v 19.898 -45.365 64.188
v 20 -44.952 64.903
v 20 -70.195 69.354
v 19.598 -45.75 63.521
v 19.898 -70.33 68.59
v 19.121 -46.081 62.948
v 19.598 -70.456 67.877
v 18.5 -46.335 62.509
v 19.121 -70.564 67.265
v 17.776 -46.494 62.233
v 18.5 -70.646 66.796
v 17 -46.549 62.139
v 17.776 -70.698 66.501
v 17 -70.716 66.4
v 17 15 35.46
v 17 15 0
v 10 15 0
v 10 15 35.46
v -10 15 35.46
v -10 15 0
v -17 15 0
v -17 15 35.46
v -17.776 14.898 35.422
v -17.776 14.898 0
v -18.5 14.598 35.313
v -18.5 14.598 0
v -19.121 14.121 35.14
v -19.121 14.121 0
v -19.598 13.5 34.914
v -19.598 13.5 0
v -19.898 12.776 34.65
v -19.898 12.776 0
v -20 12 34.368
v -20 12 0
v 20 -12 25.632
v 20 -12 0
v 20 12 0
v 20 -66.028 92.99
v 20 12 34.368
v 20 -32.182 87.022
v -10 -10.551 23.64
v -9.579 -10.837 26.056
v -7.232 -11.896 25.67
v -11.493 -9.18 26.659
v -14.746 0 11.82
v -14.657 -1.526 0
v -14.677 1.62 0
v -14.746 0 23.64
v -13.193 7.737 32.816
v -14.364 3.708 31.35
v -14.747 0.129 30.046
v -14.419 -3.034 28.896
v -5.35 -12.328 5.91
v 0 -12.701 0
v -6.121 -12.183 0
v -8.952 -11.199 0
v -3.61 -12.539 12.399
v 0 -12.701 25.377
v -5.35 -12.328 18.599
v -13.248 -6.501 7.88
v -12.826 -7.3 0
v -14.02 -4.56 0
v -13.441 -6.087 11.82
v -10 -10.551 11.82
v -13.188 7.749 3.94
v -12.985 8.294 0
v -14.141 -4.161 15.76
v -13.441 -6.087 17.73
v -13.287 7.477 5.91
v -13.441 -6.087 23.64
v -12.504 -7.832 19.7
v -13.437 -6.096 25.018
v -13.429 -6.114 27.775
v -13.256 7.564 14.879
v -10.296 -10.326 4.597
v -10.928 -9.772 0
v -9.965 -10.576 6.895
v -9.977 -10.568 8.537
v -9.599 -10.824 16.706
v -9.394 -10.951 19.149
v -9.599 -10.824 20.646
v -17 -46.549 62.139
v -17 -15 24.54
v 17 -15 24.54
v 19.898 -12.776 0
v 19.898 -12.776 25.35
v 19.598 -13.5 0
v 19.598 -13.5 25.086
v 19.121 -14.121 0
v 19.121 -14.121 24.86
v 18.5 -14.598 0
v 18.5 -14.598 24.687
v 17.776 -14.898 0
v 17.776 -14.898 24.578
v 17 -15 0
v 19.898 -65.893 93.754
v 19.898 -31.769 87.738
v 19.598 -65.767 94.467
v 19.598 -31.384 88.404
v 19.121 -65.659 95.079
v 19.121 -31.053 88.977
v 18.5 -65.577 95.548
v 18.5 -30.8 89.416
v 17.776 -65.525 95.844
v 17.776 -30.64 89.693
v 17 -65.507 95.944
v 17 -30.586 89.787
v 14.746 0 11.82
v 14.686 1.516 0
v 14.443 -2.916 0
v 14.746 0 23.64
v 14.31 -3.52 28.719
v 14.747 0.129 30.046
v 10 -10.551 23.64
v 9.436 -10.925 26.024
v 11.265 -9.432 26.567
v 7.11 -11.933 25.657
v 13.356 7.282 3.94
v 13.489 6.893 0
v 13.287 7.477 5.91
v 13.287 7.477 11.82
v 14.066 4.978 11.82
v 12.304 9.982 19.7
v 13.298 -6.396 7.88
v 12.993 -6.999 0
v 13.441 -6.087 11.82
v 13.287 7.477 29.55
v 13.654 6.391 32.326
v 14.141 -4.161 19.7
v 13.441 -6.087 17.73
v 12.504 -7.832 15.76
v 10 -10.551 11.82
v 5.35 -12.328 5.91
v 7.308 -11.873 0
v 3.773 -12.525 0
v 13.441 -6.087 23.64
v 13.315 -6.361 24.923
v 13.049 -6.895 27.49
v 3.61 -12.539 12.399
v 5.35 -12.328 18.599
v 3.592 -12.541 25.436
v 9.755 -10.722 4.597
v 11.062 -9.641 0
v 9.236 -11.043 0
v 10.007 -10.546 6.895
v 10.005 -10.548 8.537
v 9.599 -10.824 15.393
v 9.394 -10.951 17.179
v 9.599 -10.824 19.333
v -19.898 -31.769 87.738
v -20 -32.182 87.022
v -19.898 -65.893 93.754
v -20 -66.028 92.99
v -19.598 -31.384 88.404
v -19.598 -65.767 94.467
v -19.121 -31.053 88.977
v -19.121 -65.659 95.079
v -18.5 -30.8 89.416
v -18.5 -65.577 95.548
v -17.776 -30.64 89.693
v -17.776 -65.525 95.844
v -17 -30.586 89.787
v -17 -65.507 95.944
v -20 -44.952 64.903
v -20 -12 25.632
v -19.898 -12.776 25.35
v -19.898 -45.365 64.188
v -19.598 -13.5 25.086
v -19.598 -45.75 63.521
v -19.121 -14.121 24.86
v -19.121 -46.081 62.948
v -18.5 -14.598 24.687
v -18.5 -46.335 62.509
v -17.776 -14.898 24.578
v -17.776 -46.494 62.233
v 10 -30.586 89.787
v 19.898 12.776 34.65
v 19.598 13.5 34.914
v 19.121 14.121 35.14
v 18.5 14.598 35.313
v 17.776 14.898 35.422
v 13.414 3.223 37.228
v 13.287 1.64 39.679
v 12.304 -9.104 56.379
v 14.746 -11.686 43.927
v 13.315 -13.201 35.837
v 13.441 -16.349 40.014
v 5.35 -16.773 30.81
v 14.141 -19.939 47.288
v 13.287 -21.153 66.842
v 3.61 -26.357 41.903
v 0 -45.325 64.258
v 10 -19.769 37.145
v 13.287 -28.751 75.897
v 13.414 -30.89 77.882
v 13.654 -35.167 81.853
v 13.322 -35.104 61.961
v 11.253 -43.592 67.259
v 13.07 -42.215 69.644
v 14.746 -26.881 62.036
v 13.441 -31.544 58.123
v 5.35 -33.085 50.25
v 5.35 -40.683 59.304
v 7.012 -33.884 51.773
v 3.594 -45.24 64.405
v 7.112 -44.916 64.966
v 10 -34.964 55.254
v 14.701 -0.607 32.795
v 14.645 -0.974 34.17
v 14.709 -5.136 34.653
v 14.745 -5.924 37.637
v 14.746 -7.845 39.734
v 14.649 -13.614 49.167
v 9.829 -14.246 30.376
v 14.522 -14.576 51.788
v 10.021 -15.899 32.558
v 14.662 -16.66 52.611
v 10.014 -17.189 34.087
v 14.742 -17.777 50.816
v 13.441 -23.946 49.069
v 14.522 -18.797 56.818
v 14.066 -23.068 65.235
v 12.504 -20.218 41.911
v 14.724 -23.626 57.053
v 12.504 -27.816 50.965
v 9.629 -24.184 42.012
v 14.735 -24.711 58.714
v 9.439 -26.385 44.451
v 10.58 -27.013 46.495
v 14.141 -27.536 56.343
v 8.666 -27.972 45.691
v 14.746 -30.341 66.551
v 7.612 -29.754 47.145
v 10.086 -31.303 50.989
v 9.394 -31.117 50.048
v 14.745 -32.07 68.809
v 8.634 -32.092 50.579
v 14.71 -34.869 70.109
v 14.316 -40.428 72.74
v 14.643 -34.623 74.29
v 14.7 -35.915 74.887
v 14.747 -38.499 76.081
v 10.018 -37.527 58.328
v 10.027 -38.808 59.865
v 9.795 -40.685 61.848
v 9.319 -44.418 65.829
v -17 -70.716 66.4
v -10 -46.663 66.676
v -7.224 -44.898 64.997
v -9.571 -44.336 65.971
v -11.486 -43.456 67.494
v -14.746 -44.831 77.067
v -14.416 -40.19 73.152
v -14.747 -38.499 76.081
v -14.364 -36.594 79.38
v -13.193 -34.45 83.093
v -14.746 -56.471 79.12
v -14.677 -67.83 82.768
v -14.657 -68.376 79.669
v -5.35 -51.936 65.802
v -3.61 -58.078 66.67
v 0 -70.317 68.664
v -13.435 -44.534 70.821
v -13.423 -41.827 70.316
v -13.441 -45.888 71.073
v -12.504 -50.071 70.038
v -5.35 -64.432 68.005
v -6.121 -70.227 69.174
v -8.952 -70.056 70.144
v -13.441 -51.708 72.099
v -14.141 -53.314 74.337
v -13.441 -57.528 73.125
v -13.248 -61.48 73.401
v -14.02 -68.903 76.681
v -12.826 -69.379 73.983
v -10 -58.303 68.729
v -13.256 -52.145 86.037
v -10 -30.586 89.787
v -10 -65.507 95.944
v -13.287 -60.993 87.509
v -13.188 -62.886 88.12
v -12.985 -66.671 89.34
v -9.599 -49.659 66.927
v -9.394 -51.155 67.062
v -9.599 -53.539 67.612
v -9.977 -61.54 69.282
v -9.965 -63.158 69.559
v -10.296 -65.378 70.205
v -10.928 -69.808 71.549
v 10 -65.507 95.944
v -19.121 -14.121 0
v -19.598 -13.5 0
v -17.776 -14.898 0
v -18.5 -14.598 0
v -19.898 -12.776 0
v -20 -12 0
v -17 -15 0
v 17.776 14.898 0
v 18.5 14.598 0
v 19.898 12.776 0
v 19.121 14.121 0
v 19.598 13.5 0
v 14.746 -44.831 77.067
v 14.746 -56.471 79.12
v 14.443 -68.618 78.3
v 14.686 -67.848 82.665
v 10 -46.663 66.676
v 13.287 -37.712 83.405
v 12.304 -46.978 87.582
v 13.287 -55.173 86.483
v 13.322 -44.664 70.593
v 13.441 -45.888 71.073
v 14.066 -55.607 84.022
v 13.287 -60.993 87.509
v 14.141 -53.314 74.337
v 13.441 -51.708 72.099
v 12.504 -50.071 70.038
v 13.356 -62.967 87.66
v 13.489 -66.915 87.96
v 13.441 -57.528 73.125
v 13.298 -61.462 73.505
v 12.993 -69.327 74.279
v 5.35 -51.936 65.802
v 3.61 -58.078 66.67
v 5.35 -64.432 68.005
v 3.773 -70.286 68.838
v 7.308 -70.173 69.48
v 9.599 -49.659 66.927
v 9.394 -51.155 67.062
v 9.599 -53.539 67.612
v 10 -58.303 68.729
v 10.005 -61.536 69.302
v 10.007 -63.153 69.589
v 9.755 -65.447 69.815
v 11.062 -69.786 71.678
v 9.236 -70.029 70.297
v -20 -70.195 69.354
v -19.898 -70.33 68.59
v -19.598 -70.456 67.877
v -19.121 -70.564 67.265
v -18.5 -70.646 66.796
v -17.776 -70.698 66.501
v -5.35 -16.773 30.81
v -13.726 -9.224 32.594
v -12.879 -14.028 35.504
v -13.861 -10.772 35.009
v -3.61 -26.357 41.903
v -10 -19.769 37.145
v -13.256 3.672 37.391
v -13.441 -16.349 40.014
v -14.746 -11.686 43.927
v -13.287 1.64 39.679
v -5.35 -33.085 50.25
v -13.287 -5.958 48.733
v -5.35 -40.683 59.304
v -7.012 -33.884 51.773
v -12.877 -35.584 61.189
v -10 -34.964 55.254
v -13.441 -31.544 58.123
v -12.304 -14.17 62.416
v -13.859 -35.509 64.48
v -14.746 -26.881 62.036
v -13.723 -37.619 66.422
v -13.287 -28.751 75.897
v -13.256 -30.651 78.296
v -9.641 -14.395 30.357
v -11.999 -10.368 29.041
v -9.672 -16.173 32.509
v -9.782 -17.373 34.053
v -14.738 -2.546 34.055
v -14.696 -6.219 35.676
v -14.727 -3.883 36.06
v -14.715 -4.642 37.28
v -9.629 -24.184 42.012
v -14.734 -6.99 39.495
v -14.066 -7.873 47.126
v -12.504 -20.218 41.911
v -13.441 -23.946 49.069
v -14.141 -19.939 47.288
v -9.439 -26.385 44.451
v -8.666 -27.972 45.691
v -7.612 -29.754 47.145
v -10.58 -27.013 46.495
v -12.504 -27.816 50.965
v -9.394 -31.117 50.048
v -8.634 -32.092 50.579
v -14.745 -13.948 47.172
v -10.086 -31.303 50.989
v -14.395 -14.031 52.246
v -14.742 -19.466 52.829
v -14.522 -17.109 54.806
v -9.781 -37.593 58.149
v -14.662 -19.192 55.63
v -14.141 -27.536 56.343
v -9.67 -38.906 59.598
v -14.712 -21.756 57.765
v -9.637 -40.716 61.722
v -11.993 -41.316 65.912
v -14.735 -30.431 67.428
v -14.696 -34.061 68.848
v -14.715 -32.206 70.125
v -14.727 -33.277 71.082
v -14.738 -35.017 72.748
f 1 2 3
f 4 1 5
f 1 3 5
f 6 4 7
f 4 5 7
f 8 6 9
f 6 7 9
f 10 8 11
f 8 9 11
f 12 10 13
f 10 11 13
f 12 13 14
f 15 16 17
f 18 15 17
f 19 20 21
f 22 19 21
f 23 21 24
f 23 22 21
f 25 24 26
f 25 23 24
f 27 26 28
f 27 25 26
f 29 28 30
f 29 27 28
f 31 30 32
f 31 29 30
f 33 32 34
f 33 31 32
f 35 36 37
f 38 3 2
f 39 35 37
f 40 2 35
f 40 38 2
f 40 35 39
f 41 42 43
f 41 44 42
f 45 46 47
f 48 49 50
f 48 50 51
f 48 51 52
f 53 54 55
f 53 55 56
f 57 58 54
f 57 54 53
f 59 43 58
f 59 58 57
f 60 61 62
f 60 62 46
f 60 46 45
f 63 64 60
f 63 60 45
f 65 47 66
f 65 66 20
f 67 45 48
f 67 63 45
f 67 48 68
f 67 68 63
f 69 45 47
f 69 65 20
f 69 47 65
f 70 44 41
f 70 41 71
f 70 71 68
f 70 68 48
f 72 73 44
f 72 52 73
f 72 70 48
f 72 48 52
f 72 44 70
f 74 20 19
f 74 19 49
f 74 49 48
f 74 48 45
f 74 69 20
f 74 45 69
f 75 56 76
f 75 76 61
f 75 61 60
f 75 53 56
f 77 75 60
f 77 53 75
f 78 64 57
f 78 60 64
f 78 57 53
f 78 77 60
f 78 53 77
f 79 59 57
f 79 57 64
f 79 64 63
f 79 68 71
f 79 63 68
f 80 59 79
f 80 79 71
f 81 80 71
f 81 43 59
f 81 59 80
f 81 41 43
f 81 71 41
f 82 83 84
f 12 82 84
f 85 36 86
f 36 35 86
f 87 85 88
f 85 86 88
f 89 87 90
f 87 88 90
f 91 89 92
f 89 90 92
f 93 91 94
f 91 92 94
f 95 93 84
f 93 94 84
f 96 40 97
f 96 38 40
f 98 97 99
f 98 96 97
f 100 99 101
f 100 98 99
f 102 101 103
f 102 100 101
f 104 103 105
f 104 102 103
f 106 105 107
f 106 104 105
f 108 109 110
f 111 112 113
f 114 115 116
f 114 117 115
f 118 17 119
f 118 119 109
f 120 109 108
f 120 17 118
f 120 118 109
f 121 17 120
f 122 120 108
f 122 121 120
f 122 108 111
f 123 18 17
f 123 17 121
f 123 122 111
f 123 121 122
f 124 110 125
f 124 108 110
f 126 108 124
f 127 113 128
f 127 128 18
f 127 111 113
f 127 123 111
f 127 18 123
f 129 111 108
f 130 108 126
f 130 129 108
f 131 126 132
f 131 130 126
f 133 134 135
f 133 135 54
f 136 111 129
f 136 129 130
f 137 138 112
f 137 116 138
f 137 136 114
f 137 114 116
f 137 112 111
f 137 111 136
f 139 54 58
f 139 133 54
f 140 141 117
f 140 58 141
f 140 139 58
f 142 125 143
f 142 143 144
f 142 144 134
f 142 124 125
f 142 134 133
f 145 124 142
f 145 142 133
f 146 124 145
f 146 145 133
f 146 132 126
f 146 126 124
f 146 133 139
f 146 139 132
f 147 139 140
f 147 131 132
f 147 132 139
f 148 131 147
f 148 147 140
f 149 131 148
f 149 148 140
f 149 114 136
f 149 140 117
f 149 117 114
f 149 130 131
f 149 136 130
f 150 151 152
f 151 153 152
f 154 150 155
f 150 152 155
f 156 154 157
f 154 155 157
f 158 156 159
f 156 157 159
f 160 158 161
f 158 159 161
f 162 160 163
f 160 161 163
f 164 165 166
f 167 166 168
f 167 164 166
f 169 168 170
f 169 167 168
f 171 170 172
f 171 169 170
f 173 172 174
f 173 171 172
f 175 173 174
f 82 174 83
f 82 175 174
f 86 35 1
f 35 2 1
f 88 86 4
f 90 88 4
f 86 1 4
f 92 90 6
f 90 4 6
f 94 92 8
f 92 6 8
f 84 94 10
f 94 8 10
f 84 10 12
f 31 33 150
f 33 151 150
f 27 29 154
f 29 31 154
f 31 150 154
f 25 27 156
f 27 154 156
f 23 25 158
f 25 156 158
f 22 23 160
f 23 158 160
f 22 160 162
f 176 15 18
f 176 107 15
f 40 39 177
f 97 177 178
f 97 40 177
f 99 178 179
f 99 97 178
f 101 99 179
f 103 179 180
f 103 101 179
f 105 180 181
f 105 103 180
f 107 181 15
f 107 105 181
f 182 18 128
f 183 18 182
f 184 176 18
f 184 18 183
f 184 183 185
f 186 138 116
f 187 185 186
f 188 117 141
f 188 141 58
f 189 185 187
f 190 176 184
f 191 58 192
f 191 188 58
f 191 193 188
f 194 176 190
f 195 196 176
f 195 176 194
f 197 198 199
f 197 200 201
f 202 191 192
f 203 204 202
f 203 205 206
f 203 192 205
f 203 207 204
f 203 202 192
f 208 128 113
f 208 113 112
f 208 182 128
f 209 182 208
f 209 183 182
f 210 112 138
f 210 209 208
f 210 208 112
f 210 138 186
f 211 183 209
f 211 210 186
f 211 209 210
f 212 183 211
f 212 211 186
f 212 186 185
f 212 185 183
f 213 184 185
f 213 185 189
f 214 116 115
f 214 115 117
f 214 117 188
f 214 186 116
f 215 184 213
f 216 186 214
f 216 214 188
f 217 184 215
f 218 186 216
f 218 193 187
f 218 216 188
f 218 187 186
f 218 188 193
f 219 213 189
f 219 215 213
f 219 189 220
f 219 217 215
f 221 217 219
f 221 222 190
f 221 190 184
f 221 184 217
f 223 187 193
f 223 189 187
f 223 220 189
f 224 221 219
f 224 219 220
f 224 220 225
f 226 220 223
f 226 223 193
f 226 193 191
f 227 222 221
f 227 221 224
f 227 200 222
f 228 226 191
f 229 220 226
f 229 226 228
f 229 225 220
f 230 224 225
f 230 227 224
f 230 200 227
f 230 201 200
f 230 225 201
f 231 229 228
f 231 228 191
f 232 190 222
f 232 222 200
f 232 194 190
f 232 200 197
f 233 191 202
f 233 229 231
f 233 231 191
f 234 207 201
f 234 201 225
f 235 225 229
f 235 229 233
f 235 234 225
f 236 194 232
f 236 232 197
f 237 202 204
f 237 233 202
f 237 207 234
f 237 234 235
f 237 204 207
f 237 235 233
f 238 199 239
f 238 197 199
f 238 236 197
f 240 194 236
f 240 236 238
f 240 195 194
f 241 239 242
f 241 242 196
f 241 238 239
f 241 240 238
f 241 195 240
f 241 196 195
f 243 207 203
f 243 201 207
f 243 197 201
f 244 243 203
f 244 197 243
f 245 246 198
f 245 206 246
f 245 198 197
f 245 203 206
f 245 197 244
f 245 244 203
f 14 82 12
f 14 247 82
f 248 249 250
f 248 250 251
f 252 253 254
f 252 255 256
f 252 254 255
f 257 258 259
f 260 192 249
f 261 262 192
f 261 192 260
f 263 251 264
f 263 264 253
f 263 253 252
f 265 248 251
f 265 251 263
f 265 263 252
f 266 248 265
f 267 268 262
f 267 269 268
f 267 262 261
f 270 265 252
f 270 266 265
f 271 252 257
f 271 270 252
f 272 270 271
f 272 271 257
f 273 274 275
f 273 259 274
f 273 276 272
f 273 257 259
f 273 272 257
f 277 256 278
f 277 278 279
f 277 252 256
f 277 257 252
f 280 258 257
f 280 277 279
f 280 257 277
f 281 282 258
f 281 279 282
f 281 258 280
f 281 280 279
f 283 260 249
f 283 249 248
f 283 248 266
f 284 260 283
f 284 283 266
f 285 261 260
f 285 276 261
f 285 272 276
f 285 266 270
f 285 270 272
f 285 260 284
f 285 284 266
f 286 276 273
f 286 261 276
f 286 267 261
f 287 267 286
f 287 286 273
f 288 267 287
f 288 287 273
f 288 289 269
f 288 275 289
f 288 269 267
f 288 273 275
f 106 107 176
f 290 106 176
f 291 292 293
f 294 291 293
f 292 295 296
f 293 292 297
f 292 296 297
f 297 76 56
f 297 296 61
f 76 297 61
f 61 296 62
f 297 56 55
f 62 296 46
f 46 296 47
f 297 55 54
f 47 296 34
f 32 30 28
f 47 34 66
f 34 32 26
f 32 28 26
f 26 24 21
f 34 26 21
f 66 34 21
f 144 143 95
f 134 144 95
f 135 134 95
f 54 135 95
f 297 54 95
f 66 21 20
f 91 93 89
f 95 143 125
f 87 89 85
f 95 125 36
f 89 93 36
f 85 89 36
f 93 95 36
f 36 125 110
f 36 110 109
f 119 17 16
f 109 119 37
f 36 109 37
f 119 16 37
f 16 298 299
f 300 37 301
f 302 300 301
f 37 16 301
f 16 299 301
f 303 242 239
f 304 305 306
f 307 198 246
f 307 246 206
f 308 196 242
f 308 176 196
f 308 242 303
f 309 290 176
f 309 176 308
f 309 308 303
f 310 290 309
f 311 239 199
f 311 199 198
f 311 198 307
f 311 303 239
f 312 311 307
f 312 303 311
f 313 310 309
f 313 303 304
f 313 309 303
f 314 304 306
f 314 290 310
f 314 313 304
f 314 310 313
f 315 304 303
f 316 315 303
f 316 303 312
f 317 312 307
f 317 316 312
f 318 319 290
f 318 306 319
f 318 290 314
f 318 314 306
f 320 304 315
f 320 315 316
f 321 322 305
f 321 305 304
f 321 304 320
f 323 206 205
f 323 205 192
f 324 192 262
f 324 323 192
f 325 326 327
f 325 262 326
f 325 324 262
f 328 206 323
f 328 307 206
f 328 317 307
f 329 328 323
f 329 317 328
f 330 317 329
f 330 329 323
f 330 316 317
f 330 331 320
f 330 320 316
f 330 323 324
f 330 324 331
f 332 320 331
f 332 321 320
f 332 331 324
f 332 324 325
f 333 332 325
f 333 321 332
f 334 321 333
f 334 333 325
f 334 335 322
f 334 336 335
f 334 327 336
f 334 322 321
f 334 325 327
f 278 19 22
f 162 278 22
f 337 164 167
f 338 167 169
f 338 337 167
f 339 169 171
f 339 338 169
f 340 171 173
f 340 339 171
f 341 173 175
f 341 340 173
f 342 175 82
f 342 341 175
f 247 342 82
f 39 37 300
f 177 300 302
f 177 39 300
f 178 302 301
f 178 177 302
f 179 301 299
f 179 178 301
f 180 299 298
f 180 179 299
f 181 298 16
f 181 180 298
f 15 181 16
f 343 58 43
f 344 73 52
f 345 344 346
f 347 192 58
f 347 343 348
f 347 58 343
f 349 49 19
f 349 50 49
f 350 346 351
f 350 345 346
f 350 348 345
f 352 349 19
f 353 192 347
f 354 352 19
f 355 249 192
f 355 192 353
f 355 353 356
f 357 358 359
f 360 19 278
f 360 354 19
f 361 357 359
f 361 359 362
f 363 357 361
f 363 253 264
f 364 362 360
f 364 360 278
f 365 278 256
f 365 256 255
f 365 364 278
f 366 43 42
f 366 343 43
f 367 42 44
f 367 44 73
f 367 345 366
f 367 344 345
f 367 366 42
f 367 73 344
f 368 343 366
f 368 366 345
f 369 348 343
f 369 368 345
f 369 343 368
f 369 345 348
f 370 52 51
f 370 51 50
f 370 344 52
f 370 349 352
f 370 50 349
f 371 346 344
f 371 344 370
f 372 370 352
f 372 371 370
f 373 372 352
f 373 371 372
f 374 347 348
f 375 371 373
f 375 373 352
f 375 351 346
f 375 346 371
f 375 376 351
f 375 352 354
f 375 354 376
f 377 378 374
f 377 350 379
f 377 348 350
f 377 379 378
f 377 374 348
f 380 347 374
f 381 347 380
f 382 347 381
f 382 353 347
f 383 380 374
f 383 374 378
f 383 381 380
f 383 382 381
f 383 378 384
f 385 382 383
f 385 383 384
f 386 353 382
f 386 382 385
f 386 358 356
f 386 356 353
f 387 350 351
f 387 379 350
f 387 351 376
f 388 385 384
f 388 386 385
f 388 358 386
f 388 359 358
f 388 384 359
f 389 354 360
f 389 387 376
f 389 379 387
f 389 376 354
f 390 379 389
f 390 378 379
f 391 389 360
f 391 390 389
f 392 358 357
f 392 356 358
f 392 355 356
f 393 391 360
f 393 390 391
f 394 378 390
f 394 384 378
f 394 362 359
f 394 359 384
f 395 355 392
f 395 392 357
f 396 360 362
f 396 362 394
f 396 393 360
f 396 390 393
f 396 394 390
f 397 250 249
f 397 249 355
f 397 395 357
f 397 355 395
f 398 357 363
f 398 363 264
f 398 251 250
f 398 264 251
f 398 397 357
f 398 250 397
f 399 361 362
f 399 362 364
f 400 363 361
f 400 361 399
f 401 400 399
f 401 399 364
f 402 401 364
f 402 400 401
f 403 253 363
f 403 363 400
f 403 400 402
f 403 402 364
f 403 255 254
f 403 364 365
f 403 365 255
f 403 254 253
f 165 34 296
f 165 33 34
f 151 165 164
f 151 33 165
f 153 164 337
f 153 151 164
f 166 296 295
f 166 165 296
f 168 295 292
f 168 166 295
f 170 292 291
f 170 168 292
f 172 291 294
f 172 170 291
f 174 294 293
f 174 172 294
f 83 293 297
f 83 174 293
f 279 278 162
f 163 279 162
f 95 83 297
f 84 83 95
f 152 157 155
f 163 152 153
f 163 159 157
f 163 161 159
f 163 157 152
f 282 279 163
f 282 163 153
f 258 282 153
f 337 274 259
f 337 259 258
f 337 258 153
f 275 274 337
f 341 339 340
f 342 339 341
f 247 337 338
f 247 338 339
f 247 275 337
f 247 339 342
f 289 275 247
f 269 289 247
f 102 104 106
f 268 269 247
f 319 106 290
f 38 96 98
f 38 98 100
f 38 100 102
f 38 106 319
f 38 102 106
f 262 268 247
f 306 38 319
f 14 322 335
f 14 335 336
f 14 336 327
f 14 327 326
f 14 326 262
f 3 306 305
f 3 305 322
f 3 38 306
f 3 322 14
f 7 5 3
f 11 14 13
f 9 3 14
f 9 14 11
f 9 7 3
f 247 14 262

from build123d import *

# Parameters (mm, degrees)
F3_R = 3


with BuildPart() as f2:
    # F2: sweep along a path in F1
    with BuildLine(Plane.YZ) as f2_path:
        Line((0, 0), (0, 30))
        Line((0, 30), (-38.5672565812, 75.9626665871))
        Line((-38.5672565812, 75.9626665871), (-68.1114891716, 81.1721119171))
    # F0 (on Top) → F2 (sweep)
    with BuildSketch(Plane.XY):
        with BuildLine():
            Line((20, -15), (20, 15))
            Line((20, 15), (10, 15))
            add(Edge.make_bspline(
                [(10, 15), (12.3940897704, 9.9797566054), (16.8411980376, 0.6544730759), (11.1651576872, -12.4181404175), (3.6445260134, -12.6084000337), (0, -12.7006005496)],
                knots=[0, 0, 0, 0, 0.3753981471, 0.6973156246, 1, 1, 1, 1], degree=3))
            add(Edge.make_bspline(
                [(-10, 15), (-12.3940897704, 9.9797566054), (-16.8411980376, 0.6544730759), (-11.1651576872, -12.4181404175), (-3.6445260134, -12.6084000337), (0, -12.7006005496)],
                knots=[0, 0, 0, 0, 0.3753981471, 0.6973156246, 1, 1, 1, 1], degree=3))
            Line((-10, 15), (-20, 15))
            Line((-20, 15), (-20, -15))
            Line((-20, -15), (20, -15))
        make_face()
    sweep(path=f2_path.line, transition=Transition.RIGHT)

    # F3
    f3_edges = [f2.edges().sort_by_distance(p)[0] for p in [
        (-20, 15, 17.729777),
        (-20, -7.792962, 62.623147),
        (-20, -48.046345, 92.865485),
        (-20, -15, 12.270223),
        (-20, -30.774295, 43.339519),
        (-20, -58.632401, 64.269294),
        (20, -48.046345, 92.865485),
        (20, -7.792962, 62.623147),
        (20, 15, 17.729777),
        (20, -15, 12.270223),
        (20, -30.774295, 43.339519),
        (20, -58.632401, 64.269294),
    ]]
    fillet(f3_edges, radius=F3_R)


solid = f2.part
